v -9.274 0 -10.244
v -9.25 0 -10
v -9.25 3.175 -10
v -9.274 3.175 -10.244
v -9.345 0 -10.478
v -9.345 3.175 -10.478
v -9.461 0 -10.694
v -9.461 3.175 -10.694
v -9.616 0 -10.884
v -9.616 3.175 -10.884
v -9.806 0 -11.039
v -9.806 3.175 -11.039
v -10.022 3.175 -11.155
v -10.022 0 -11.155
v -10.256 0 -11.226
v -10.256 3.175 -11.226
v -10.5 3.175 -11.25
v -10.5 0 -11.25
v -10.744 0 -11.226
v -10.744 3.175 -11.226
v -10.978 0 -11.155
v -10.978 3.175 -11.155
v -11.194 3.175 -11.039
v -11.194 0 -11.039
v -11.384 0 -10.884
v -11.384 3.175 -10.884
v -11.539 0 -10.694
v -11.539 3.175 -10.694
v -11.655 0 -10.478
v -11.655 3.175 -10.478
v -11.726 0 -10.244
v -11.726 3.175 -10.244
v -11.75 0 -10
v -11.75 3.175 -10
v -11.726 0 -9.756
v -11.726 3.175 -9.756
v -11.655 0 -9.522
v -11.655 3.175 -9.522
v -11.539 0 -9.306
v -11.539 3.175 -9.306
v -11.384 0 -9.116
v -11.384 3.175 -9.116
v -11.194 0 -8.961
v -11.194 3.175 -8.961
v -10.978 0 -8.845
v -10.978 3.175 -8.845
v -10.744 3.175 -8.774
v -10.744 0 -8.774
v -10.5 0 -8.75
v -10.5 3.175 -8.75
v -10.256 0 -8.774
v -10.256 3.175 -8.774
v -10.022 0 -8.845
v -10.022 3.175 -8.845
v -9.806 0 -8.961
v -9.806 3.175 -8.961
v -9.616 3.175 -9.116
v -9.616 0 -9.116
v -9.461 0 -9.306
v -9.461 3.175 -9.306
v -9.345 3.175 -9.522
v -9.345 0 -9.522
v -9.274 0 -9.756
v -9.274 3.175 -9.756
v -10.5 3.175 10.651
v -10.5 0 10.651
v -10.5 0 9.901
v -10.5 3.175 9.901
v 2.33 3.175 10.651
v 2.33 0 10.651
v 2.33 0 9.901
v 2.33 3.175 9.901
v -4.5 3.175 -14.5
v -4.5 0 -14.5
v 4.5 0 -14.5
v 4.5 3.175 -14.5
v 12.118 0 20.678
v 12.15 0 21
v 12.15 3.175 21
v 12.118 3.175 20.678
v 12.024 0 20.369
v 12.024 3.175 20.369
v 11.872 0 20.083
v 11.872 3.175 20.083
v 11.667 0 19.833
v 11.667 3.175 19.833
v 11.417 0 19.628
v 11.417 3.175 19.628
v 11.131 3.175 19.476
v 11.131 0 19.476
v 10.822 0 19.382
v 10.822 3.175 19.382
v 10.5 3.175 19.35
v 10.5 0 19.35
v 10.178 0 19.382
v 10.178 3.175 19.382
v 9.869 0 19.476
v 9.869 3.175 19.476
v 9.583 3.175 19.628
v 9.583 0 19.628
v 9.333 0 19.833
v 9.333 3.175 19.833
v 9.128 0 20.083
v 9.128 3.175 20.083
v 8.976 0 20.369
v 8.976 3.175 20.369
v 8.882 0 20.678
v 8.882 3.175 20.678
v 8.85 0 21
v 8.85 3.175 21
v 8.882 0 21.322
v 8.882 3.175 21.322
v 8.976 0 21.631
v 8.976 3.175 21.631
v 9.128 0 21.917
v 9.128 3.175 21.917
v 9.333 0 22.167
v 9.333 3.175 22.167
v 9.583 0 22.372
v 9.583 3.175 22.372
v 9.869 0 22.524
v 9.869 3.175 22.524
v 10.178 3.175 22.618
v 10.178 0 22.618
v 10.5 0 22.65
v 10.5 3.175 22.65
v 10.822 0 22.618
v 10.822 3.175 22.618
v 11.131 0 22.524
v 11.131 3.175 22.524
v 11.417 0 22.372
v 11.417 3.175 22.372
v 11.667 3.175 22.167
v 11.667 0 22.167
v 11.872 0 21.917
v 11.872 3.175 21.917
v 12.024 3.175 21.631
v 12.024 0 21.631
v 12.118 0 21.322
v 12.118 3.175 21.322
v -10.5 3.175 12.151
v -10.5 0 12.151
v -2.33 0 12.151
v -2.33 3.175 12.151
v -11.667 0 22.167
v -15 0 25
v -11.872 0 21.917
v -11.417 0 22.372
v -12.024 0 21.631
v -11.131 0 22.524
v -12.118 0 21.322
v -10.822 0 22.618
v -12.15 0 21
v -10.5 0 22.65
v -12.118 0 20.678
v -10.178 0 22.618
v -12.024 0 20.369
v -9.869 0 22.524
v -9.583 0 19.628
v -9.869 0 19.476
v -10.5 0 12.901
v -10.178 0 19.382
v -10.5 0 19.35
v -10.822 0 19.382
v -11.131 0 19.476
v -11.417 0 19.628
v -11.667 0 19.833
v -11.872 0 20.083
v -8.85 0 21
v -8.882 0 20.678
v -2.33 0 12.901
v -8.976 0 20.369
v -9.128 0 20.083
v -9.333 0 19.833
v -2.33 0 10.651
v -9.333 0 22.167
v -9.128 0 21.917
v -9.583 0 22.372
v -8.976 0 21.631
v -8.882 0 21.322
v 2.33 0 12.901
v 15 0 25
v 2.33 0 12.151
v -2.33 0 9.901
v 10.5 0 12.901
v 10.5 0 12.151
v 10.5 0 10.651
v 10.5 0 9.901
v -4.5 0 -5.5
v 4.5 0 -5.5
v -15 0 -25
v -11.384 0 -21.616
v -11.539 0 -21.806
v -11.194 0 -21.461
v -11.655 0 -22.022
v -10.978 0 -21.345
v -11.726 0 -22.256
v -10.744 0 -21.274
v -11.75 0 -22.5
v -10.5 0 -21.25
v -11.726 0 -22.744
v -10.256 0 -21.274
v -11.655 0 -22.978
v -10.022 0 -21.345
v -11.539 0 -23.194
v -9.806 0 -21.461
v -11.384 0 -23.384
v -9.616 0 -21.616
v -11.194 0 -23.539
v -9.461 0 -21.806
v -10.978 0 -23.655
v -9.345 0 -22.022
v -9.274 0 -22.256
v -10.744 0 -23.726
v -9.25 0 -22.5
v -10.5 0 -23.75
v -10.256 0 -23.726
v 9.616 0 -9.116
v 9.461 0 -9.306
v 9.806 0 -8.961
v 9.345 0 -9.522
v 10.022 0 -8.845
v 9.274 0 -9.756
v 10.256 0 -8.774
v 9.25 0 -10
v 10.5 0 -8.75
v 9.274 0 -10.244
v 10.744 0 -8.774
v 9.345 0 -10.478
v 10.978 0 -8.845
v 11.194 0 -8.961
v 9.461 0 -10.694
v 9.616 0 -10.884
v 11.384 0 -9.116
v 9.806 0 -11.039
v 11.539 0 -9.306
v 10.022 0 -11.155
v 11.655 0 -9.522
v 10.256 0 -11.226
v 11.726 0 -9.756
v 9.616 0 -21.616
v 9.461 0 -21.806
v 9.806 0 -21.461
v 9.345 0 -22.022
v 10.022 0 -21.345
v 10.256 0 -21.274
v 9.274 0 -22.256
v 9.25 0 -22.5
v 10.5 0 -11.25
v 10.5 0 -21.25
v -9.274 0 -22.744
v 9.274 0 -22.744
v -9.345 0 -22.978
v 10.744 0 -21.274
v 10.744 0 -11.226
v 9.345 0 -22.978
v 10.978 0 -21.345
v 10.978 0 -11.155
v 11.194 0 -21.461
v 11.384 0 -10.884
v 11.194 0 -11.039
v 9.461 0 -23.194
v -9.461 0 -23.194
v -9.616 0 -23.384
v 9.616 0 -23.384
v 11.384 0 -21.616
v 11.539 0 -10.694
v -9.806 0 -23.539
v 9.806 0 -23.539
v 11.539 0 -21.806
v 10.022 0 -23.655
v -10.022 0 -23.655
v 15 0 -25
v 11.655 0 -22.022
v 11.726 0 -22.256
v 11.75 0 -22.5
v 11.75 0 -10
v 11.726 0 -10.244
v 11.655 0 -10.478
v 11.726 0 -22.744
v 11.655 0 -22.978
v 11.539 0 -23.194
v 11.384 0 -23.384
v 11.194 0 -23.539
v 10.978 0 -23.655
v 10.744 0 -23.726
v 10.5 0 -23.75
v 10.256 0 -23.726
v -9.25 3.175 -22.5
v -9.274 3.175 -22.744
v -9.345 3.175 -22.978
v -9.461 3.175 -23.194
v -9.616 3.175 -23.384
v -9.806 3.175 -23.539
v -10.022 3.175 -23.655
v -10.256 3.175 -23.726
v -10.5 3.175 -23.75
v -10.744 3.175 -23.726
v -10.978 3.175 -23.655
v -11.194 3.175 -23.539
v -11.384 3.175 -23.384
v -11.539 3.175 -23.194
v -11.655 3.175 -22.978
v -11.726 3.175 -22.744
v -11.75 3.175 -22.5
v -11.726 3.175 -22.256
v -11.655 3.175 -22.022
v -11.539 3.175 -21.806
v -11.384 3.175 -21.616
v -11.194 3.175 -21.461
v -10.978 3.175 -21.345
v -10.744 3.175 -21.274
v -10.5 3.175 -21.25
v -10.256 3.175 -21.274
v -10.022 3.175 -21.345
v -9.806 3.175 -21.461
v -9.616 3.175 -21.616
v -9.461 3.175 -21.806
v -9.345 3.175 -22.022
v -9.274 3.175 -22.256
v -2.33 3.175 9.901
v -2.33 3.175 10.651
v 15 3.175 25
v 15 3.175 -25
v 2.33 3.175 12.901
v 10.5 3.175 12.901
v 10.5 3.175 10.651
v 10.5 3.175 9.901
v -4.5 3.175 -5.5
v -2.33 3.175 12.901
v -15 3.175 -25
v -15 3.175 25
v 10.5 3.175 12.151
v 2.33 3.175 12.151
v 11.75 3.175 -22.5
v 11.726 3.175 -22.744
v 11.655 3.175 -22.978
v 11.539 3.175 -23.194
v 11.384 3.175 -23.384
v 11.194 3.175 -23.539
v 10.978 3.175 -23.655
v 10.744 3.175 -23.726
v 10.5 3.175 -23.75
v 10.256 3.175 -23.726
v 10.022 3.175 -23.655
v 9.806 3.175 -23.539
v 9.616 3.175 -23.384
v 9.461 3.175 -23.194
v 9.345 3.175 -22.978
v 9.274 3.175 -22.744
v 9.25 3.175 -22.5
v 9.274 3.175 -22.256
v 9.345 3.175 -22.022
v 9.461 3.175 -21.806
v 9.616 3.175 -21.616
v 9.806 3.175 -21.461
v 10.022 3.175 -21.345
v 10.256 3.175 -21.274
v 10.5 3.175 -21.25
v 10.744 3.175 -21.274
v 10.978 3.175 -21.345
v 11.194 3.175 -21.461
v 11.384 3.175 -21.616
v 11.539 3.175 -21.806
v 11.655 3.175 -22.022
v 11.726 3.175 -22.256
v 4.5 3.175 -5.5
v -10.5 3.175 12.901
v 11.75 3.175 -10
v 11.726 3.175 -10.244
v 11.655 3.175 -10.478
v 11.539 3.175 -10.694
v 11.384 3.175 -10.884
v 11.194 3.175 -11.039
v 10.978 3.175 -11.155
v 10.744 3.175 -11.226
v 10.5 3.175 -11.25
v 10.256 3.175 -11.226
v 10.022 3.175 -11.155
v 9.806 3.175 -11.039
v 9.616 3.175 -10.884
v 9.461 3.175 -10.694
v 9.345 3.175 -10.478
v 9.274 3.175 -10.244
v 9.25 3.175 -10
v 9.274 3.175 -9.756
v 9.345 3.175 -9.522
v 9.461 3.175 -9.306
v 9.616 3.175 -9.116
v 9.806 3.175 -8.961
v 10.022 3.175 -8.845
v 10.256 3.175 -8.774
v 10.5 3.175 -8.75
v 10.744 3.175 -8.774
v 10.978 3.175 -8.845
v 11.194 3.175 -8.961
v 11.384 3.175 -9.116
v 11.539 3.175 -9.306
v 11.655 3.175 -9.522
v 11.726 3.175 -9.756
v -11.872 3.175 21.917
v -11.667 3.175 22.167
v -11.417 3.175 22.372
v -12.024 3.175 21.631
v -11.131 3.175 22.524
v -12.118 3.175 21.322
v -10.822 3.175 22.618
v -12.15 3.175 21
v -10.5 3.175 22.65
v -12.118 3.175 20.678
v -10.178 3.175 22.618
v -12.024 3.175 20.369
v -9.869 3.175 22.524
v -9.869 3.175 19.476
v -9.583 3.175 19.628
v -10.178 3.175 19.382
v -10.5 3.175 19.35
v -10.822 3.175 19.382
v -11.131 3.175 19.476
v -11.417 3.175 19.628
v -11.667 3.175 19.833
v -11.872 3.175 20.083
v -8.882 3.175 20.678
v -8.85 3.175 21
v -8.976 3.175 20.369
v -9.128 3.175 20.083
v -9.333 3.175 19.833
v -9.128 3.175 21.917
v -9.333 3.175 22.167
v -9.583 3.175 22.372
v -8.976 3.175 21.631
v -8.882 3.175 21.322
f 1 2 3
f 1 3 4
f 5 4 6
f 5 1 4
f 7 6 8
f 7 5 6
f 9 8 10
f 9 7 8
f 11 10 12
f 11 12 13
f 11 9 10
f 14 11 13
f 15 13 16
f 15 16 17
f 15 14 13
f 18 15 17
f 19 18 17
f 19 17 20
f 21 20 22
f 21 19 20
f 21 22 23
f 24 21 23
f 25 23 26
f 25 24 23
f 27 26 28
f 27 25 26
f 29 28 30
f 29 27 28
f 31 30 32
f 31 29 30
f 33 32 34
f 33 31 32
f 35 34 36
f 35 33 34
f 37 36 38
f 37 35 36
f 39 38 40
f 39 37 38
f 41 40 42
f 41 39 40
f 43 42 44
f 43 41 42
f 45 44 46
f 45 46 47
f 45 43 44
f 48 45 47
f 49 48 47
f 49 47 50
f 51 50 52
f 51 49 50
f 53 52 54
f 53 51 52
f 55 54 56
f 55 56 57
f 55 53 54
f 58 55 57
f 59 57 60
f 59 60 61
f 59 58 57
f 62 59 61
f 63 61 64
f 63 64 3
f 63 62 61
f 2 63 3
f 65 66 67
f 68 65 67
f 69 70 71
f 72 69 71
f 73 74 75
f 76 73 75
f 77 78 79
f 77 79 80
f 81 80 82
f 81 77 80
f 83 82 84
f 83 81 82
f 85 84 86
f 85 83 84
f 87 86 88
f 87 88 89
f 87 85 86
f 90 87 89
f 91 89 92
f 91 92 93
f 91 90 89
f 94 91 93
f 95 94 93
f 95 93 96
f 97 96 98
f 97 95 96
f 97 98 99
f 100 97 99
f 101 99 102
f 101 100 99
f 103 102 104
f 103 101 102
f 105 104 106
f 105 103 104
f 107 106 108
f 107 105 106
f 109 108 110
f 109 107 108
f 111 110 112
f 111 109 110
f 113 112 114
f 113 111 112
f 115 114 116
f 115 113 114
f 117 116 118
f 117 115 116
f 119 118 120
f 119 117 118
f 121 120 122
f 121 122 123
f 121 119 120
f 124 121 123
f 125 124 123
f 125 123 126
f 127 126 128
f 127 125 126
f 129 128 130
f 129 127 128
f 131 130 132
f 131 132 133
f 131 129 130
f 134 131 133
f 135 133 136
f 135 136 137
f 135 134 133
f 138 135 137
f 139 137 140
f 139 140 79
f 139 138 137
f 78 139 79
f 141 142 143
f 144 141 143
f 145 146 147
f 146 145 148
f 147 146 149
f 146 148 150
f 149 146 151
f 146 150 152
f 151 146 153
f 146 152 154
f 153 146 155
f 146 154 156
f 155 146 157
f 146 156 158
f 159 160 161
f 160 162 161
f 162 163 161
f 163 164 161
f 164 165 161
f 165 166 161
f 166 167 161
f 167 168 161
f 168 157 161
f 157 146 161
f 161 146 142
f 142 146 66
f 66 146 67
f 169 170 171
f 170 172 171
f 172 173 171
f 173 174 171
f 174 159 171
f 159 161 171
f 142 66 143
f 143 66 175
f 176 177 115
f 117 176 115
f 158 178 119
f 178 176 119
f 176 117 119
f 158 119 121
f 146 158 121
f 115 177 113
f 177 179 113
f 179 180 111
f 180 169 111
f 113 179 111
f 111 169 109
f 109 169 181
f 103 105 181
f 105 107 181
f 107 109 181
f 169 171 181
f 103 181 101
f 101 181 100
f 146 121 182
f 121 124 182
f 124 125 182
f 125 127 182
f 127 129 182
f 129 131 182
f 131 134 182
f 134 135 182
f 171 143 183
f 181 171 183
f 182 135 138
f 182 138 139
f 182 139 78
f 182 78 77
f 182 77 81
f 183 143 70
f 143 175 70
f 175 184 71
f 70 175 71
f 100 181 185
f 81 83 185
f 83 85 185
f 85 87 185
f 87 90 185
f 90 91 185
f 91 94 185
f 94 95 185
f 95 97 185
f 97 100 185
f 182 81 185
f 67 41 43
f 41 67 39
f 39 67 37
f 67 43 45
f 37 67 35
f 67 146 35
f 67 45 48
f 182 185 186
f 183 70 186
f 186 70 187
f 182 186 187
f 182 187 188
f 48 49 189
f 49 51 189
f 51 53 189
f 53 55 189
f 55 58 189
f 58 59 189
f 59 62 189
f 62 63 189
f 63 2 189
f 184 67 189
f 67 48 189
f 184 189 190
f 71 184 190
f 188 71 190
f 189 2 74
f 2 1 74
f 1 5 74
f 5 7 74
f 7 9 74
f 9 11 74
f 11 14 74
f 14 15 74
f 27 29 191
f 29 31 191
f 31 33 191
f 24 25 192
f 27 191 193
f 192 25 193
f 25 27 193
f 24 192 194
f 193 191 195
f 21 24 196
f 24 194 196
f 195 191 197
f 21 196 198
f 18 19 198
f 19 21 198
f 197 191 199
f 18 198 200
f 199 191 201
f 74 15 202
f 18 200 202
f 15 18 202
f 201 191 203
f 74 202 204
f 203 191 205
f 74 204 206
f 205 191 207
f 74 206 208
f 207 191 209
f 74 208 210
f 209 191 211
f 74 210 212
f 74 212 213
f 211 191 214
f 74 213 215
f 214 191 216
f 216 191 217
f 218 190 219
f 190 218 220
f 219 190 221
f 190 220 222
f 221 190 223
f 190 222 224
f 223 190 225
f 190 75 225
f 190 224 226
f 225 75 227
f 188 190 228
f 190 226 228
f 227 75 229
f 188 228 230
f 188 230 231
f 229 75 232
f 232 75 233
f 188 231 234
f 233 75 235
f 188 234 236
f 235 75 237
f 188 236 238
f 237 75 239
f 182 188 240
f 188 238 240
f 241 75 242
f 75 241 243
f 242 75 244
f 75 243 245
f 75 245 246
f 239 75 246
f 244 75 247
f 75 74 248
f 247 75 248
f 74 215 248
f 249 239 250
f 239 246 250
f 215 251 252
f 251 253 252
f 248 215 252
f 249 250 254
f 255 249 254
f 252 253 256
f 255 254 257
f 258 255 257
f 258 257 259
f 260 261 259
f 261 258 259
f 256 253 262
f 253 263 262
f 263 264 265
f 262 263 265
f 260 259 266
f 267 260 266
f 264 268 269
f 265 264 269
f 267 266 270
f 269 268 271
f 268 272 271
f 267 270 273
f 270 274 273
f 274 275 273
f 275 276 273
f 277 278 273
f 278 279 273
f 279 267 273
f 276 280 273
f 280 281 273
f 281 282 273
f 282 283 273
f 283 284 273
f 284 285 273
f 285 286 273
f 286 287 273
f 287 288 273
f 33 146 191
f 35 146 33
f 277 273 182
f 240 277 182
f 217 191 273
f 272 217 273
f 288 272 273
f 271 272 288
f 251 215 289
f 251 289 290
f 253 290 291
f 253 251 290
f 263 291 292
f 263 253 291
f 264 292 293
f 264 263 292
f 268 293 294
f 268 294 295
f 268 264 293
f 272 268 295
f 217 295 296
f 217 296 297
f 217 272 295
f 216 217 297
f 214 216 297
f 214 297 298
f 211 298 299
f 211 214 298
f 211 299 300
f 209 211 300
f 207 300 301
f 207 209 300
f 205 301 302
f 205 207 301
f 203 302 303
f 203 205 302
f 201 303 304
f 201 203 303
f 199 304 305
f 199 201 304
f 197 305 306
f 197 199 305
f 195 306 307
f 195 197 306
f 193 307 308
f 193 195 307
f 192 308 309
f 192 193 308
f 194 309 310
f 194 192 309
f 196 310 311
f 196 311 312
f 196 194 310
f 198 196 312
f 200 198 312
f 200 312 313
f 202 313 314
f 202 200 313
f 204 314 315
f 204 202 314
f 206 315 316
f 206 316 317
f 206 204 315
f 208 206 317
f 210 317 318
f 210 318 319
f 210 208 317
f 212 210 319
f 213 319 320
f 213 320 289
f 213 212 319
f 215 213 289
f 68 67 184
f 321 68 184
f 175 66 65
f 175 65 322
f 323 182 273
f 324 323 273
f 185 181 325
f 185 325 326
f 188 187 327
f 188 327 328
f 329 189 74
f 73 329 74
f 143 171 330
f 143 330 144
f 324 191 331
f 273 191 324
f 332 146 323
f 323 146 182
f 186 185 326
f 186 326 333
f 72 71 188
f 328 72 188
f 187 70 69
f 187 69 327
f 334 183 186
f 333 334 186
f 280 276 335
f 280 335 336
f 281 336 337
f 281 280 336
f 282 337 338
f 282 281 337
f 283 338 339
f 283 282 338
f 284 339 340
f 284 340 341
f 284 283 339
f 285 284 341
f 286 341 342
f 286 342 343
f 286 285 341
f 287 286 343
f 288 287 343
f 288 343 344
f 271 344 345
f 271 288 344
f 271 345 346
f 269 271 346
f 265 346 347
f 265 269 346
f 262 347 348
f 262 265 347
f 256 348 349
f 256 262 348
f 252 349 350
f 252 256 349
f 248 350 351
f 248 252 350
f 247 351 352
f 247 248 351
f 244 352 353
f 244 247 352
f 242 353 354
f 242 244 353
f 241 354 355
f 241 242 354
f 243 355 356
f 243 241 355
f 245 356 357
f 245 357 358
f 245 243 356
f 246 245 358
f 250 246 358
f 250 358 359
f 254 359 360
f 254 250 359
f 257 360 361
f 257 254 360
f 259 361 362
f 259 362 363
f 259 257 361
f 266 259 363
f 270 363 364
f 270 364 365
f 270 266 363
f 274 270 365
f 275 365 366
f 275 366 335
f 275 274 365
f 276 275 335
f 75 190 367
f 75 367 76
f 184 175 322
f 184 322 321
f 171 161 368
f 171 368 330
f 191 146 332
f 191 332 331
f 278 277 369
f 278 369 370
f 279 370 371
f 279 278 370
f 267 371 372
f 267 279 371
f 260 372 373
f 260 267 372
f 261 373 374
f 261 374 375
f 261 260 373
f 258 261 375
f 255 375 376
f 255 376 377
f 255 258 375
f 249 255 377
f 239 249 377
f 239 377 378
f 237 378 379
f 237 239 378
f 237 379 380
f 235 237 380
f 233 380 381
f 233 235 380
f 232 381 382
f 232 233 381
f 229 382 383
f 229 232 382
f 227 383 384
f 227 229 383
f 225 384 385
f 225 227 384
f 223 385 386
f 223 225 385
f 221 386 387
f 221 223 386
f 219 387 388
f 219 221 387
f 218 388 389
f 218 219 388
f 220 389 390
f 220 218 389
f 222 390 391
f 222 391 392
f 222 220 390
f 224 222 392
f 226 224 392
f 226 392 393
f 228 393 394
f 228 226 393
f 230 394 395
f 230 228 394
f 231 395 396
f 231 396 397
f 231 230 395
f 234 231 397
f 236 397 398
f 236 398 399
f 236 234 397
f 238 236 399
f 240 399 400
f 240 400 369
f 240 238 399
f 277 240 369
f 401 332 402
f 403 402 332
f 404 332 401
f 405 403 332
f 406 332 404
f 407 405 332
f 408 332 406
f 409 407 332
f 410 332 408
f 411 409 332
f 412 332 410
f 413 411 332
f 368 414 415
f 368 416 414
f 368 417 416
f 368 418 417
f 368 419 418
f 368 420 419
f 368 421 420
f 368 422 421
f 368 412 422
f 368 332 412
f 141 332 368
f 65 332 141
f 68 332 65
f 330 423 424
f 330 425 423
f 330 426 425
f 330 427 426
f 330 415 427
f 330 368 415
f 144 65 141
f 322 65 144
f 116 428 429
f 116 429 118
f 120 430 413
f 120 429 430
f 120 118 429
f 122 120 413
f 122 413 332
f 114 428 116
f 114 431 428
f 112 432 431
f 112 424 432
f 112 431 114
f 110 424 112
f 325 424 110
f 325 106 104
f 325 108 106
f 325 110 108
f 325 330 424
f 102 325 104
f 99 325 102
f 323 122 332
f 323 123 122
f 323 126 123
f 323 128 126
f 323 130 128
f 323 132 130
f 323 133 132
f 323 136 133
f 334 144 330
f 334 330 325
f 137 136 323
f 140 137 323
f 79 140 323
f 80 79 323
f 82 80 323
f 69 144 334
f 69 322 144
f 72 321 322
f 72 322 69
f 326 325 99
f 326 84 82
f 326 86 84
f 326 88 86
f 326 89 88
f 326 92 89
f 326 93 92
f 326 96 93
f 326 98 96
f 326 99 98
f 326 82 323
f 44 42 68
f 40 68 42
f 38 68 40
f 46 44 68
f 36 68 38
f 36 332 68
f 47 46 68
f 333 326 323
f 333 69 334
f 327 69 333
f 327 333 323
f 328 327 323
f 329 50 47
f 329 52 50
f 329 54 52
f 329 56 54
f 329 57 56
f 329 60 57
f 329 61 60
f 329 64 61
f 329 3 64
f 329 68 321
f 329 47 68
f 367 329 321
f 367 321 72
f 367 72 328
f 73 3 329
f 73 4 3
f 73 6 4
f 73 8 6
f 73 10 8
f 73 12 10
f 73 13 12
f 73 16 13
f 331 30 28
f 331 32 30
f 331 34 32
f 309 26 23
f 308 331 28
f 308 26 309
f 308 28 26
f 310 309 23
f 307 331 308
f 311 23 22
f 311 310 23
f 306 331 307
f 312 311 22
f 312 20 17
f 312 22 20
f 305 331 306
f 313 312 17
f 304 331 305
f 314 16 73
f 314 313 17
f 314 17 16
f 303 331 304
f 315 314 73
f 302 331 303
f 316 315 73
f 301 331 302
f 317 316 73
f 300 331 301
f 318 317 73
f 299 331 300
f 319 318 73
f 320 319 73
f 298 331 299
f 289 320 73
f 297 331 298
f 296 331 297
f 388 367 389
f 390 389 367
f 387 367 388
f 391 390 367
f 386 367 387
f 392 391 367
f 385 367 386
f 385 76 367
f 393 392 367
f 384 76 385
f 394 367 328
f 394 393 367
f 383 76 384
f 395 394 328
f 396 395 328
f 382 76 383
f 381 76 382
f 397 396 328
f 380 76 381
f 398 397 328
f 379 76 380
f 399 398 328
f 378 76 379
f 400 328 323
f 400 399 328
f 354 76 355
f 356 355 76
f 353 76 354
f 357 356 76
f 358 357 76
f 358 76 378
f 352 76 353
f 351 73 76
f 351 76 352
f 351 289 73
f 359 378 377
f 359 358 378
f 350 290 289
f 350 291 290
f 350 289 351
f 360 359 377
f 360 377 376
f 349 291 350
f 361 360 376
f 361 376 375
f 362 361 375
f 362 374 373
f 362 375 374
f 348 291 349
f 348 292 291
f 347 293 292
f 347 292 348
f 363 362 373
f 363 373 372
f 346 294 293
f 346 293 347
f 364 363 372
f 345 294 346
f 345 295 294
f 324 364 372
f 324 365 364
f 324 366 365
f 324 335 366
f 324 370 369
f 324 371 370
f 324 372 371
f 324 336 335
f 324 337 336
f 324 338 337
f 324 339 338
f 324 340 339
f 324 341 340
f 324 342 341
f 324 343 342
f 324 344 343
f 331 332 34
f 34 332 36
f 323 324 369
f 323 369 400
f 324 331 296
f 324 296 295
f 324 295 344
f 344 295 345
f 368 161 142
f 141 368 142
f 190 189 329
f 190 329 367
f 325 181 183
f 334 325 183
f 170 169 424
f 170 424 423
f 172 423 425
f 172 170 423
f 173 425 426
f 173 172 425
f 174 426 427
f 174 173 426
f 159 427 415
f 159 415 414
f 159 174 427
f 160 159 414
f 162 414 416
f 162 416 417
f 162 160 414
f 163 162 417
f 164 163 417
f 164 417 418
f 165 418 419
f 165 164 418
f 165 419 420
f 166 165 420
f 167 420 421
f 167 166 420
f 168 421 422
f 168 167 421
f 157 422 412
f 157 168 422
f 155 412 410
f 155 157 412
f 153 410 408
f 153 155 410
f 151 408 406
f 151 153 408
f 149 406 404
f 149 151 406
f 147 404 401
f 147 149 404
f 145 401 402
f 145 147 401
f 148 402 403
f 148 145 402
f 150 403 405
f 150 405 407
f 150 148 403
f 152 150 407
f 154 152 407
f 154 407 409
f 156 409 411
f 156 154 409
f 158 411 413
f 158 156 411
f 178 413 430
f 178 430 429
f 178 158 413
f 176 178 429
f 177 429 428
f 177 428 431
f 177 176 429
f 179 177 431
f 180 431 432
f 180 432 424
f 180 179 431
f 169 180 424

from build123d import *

# Parameters (mm, degrees)
SKETCH1_W           = 30
SKETCH1_H           = 50
SKETCH1_R           = 1.25
SKETCH1_R_2         = 1.65
SKETCH1_W_2         = 8.169972816
SKETCH1_H_2         = 0.75
SKETCH1_W_3         = 9
SKETCH1_H_3         = 9
BOSS_EXTRUDE1_DEPTH = 3.175


with BuildPart() as part:
    # Sketch1 → Boss-Extrude1 (new body)
    with BuildSketch(Plane(origin=(0, 0, 0), x_dir=(1, 0, 0), z_dir=(0, 1, 0))):
        Rectangle(SKETCH1_W, SKETCH1_H)
        with Locations((-10.5, 22.5)):
            Circle(SKETCH1_R, mode=Mode.SUBTRACT)
        with Locations((10.5, 22.5)):
            Circle(SKETCH1_R, mode=Mode.SUBTRACT)
        with Locations((10.5, 10)):
            Circle(SKETCH1_R, mode=Mode.SUBTRACT)
        with Locations((-10.5, 10)):
            Circle(SKETCH1_R, mode=Mode.SUBTRACT)
        with Locations((-10.5, -21)):
            Circle(SKETCH1_R_2, mode=Mode.SUBTRACT)
        with Locations((10.5, -21)):
            Circle(SKETCH1_R_2, mode=Mode.SUBTRACT)
        with Locations((6.415013592, -10.275512249)):
            Rectangle(SKETCH1_W_2, SKETCH1_H_2, mode=Mode.SUBTRACT)
        with Locations((-6.415013592, -12.525512249)):
            Rectangle(SKETCH1_W_2, SKETCH1_H_2, mode=Mode.SUBTRACT)
        with Locations((-6.415013592, -10.275512249)):
            Rectangle(SKETCH1_W_2, SKETCH1_H_2, mode=Mode.SUBTRACT)
        with Locations((6.415013592, -12.525512249)):
            Rectangle(SKETCH1_W_2, SKETCH1_H_2, mode=Mode.SUBTRACT)
        with Locations((0, 10)):
            Rectangle(SKETCH1_W_3, SKETCH1_H_3, mode=Mode.SUBTRACT)
    extrude(amount=BOSS_EXTRUDE1_DEPTH)


solid = part.part
